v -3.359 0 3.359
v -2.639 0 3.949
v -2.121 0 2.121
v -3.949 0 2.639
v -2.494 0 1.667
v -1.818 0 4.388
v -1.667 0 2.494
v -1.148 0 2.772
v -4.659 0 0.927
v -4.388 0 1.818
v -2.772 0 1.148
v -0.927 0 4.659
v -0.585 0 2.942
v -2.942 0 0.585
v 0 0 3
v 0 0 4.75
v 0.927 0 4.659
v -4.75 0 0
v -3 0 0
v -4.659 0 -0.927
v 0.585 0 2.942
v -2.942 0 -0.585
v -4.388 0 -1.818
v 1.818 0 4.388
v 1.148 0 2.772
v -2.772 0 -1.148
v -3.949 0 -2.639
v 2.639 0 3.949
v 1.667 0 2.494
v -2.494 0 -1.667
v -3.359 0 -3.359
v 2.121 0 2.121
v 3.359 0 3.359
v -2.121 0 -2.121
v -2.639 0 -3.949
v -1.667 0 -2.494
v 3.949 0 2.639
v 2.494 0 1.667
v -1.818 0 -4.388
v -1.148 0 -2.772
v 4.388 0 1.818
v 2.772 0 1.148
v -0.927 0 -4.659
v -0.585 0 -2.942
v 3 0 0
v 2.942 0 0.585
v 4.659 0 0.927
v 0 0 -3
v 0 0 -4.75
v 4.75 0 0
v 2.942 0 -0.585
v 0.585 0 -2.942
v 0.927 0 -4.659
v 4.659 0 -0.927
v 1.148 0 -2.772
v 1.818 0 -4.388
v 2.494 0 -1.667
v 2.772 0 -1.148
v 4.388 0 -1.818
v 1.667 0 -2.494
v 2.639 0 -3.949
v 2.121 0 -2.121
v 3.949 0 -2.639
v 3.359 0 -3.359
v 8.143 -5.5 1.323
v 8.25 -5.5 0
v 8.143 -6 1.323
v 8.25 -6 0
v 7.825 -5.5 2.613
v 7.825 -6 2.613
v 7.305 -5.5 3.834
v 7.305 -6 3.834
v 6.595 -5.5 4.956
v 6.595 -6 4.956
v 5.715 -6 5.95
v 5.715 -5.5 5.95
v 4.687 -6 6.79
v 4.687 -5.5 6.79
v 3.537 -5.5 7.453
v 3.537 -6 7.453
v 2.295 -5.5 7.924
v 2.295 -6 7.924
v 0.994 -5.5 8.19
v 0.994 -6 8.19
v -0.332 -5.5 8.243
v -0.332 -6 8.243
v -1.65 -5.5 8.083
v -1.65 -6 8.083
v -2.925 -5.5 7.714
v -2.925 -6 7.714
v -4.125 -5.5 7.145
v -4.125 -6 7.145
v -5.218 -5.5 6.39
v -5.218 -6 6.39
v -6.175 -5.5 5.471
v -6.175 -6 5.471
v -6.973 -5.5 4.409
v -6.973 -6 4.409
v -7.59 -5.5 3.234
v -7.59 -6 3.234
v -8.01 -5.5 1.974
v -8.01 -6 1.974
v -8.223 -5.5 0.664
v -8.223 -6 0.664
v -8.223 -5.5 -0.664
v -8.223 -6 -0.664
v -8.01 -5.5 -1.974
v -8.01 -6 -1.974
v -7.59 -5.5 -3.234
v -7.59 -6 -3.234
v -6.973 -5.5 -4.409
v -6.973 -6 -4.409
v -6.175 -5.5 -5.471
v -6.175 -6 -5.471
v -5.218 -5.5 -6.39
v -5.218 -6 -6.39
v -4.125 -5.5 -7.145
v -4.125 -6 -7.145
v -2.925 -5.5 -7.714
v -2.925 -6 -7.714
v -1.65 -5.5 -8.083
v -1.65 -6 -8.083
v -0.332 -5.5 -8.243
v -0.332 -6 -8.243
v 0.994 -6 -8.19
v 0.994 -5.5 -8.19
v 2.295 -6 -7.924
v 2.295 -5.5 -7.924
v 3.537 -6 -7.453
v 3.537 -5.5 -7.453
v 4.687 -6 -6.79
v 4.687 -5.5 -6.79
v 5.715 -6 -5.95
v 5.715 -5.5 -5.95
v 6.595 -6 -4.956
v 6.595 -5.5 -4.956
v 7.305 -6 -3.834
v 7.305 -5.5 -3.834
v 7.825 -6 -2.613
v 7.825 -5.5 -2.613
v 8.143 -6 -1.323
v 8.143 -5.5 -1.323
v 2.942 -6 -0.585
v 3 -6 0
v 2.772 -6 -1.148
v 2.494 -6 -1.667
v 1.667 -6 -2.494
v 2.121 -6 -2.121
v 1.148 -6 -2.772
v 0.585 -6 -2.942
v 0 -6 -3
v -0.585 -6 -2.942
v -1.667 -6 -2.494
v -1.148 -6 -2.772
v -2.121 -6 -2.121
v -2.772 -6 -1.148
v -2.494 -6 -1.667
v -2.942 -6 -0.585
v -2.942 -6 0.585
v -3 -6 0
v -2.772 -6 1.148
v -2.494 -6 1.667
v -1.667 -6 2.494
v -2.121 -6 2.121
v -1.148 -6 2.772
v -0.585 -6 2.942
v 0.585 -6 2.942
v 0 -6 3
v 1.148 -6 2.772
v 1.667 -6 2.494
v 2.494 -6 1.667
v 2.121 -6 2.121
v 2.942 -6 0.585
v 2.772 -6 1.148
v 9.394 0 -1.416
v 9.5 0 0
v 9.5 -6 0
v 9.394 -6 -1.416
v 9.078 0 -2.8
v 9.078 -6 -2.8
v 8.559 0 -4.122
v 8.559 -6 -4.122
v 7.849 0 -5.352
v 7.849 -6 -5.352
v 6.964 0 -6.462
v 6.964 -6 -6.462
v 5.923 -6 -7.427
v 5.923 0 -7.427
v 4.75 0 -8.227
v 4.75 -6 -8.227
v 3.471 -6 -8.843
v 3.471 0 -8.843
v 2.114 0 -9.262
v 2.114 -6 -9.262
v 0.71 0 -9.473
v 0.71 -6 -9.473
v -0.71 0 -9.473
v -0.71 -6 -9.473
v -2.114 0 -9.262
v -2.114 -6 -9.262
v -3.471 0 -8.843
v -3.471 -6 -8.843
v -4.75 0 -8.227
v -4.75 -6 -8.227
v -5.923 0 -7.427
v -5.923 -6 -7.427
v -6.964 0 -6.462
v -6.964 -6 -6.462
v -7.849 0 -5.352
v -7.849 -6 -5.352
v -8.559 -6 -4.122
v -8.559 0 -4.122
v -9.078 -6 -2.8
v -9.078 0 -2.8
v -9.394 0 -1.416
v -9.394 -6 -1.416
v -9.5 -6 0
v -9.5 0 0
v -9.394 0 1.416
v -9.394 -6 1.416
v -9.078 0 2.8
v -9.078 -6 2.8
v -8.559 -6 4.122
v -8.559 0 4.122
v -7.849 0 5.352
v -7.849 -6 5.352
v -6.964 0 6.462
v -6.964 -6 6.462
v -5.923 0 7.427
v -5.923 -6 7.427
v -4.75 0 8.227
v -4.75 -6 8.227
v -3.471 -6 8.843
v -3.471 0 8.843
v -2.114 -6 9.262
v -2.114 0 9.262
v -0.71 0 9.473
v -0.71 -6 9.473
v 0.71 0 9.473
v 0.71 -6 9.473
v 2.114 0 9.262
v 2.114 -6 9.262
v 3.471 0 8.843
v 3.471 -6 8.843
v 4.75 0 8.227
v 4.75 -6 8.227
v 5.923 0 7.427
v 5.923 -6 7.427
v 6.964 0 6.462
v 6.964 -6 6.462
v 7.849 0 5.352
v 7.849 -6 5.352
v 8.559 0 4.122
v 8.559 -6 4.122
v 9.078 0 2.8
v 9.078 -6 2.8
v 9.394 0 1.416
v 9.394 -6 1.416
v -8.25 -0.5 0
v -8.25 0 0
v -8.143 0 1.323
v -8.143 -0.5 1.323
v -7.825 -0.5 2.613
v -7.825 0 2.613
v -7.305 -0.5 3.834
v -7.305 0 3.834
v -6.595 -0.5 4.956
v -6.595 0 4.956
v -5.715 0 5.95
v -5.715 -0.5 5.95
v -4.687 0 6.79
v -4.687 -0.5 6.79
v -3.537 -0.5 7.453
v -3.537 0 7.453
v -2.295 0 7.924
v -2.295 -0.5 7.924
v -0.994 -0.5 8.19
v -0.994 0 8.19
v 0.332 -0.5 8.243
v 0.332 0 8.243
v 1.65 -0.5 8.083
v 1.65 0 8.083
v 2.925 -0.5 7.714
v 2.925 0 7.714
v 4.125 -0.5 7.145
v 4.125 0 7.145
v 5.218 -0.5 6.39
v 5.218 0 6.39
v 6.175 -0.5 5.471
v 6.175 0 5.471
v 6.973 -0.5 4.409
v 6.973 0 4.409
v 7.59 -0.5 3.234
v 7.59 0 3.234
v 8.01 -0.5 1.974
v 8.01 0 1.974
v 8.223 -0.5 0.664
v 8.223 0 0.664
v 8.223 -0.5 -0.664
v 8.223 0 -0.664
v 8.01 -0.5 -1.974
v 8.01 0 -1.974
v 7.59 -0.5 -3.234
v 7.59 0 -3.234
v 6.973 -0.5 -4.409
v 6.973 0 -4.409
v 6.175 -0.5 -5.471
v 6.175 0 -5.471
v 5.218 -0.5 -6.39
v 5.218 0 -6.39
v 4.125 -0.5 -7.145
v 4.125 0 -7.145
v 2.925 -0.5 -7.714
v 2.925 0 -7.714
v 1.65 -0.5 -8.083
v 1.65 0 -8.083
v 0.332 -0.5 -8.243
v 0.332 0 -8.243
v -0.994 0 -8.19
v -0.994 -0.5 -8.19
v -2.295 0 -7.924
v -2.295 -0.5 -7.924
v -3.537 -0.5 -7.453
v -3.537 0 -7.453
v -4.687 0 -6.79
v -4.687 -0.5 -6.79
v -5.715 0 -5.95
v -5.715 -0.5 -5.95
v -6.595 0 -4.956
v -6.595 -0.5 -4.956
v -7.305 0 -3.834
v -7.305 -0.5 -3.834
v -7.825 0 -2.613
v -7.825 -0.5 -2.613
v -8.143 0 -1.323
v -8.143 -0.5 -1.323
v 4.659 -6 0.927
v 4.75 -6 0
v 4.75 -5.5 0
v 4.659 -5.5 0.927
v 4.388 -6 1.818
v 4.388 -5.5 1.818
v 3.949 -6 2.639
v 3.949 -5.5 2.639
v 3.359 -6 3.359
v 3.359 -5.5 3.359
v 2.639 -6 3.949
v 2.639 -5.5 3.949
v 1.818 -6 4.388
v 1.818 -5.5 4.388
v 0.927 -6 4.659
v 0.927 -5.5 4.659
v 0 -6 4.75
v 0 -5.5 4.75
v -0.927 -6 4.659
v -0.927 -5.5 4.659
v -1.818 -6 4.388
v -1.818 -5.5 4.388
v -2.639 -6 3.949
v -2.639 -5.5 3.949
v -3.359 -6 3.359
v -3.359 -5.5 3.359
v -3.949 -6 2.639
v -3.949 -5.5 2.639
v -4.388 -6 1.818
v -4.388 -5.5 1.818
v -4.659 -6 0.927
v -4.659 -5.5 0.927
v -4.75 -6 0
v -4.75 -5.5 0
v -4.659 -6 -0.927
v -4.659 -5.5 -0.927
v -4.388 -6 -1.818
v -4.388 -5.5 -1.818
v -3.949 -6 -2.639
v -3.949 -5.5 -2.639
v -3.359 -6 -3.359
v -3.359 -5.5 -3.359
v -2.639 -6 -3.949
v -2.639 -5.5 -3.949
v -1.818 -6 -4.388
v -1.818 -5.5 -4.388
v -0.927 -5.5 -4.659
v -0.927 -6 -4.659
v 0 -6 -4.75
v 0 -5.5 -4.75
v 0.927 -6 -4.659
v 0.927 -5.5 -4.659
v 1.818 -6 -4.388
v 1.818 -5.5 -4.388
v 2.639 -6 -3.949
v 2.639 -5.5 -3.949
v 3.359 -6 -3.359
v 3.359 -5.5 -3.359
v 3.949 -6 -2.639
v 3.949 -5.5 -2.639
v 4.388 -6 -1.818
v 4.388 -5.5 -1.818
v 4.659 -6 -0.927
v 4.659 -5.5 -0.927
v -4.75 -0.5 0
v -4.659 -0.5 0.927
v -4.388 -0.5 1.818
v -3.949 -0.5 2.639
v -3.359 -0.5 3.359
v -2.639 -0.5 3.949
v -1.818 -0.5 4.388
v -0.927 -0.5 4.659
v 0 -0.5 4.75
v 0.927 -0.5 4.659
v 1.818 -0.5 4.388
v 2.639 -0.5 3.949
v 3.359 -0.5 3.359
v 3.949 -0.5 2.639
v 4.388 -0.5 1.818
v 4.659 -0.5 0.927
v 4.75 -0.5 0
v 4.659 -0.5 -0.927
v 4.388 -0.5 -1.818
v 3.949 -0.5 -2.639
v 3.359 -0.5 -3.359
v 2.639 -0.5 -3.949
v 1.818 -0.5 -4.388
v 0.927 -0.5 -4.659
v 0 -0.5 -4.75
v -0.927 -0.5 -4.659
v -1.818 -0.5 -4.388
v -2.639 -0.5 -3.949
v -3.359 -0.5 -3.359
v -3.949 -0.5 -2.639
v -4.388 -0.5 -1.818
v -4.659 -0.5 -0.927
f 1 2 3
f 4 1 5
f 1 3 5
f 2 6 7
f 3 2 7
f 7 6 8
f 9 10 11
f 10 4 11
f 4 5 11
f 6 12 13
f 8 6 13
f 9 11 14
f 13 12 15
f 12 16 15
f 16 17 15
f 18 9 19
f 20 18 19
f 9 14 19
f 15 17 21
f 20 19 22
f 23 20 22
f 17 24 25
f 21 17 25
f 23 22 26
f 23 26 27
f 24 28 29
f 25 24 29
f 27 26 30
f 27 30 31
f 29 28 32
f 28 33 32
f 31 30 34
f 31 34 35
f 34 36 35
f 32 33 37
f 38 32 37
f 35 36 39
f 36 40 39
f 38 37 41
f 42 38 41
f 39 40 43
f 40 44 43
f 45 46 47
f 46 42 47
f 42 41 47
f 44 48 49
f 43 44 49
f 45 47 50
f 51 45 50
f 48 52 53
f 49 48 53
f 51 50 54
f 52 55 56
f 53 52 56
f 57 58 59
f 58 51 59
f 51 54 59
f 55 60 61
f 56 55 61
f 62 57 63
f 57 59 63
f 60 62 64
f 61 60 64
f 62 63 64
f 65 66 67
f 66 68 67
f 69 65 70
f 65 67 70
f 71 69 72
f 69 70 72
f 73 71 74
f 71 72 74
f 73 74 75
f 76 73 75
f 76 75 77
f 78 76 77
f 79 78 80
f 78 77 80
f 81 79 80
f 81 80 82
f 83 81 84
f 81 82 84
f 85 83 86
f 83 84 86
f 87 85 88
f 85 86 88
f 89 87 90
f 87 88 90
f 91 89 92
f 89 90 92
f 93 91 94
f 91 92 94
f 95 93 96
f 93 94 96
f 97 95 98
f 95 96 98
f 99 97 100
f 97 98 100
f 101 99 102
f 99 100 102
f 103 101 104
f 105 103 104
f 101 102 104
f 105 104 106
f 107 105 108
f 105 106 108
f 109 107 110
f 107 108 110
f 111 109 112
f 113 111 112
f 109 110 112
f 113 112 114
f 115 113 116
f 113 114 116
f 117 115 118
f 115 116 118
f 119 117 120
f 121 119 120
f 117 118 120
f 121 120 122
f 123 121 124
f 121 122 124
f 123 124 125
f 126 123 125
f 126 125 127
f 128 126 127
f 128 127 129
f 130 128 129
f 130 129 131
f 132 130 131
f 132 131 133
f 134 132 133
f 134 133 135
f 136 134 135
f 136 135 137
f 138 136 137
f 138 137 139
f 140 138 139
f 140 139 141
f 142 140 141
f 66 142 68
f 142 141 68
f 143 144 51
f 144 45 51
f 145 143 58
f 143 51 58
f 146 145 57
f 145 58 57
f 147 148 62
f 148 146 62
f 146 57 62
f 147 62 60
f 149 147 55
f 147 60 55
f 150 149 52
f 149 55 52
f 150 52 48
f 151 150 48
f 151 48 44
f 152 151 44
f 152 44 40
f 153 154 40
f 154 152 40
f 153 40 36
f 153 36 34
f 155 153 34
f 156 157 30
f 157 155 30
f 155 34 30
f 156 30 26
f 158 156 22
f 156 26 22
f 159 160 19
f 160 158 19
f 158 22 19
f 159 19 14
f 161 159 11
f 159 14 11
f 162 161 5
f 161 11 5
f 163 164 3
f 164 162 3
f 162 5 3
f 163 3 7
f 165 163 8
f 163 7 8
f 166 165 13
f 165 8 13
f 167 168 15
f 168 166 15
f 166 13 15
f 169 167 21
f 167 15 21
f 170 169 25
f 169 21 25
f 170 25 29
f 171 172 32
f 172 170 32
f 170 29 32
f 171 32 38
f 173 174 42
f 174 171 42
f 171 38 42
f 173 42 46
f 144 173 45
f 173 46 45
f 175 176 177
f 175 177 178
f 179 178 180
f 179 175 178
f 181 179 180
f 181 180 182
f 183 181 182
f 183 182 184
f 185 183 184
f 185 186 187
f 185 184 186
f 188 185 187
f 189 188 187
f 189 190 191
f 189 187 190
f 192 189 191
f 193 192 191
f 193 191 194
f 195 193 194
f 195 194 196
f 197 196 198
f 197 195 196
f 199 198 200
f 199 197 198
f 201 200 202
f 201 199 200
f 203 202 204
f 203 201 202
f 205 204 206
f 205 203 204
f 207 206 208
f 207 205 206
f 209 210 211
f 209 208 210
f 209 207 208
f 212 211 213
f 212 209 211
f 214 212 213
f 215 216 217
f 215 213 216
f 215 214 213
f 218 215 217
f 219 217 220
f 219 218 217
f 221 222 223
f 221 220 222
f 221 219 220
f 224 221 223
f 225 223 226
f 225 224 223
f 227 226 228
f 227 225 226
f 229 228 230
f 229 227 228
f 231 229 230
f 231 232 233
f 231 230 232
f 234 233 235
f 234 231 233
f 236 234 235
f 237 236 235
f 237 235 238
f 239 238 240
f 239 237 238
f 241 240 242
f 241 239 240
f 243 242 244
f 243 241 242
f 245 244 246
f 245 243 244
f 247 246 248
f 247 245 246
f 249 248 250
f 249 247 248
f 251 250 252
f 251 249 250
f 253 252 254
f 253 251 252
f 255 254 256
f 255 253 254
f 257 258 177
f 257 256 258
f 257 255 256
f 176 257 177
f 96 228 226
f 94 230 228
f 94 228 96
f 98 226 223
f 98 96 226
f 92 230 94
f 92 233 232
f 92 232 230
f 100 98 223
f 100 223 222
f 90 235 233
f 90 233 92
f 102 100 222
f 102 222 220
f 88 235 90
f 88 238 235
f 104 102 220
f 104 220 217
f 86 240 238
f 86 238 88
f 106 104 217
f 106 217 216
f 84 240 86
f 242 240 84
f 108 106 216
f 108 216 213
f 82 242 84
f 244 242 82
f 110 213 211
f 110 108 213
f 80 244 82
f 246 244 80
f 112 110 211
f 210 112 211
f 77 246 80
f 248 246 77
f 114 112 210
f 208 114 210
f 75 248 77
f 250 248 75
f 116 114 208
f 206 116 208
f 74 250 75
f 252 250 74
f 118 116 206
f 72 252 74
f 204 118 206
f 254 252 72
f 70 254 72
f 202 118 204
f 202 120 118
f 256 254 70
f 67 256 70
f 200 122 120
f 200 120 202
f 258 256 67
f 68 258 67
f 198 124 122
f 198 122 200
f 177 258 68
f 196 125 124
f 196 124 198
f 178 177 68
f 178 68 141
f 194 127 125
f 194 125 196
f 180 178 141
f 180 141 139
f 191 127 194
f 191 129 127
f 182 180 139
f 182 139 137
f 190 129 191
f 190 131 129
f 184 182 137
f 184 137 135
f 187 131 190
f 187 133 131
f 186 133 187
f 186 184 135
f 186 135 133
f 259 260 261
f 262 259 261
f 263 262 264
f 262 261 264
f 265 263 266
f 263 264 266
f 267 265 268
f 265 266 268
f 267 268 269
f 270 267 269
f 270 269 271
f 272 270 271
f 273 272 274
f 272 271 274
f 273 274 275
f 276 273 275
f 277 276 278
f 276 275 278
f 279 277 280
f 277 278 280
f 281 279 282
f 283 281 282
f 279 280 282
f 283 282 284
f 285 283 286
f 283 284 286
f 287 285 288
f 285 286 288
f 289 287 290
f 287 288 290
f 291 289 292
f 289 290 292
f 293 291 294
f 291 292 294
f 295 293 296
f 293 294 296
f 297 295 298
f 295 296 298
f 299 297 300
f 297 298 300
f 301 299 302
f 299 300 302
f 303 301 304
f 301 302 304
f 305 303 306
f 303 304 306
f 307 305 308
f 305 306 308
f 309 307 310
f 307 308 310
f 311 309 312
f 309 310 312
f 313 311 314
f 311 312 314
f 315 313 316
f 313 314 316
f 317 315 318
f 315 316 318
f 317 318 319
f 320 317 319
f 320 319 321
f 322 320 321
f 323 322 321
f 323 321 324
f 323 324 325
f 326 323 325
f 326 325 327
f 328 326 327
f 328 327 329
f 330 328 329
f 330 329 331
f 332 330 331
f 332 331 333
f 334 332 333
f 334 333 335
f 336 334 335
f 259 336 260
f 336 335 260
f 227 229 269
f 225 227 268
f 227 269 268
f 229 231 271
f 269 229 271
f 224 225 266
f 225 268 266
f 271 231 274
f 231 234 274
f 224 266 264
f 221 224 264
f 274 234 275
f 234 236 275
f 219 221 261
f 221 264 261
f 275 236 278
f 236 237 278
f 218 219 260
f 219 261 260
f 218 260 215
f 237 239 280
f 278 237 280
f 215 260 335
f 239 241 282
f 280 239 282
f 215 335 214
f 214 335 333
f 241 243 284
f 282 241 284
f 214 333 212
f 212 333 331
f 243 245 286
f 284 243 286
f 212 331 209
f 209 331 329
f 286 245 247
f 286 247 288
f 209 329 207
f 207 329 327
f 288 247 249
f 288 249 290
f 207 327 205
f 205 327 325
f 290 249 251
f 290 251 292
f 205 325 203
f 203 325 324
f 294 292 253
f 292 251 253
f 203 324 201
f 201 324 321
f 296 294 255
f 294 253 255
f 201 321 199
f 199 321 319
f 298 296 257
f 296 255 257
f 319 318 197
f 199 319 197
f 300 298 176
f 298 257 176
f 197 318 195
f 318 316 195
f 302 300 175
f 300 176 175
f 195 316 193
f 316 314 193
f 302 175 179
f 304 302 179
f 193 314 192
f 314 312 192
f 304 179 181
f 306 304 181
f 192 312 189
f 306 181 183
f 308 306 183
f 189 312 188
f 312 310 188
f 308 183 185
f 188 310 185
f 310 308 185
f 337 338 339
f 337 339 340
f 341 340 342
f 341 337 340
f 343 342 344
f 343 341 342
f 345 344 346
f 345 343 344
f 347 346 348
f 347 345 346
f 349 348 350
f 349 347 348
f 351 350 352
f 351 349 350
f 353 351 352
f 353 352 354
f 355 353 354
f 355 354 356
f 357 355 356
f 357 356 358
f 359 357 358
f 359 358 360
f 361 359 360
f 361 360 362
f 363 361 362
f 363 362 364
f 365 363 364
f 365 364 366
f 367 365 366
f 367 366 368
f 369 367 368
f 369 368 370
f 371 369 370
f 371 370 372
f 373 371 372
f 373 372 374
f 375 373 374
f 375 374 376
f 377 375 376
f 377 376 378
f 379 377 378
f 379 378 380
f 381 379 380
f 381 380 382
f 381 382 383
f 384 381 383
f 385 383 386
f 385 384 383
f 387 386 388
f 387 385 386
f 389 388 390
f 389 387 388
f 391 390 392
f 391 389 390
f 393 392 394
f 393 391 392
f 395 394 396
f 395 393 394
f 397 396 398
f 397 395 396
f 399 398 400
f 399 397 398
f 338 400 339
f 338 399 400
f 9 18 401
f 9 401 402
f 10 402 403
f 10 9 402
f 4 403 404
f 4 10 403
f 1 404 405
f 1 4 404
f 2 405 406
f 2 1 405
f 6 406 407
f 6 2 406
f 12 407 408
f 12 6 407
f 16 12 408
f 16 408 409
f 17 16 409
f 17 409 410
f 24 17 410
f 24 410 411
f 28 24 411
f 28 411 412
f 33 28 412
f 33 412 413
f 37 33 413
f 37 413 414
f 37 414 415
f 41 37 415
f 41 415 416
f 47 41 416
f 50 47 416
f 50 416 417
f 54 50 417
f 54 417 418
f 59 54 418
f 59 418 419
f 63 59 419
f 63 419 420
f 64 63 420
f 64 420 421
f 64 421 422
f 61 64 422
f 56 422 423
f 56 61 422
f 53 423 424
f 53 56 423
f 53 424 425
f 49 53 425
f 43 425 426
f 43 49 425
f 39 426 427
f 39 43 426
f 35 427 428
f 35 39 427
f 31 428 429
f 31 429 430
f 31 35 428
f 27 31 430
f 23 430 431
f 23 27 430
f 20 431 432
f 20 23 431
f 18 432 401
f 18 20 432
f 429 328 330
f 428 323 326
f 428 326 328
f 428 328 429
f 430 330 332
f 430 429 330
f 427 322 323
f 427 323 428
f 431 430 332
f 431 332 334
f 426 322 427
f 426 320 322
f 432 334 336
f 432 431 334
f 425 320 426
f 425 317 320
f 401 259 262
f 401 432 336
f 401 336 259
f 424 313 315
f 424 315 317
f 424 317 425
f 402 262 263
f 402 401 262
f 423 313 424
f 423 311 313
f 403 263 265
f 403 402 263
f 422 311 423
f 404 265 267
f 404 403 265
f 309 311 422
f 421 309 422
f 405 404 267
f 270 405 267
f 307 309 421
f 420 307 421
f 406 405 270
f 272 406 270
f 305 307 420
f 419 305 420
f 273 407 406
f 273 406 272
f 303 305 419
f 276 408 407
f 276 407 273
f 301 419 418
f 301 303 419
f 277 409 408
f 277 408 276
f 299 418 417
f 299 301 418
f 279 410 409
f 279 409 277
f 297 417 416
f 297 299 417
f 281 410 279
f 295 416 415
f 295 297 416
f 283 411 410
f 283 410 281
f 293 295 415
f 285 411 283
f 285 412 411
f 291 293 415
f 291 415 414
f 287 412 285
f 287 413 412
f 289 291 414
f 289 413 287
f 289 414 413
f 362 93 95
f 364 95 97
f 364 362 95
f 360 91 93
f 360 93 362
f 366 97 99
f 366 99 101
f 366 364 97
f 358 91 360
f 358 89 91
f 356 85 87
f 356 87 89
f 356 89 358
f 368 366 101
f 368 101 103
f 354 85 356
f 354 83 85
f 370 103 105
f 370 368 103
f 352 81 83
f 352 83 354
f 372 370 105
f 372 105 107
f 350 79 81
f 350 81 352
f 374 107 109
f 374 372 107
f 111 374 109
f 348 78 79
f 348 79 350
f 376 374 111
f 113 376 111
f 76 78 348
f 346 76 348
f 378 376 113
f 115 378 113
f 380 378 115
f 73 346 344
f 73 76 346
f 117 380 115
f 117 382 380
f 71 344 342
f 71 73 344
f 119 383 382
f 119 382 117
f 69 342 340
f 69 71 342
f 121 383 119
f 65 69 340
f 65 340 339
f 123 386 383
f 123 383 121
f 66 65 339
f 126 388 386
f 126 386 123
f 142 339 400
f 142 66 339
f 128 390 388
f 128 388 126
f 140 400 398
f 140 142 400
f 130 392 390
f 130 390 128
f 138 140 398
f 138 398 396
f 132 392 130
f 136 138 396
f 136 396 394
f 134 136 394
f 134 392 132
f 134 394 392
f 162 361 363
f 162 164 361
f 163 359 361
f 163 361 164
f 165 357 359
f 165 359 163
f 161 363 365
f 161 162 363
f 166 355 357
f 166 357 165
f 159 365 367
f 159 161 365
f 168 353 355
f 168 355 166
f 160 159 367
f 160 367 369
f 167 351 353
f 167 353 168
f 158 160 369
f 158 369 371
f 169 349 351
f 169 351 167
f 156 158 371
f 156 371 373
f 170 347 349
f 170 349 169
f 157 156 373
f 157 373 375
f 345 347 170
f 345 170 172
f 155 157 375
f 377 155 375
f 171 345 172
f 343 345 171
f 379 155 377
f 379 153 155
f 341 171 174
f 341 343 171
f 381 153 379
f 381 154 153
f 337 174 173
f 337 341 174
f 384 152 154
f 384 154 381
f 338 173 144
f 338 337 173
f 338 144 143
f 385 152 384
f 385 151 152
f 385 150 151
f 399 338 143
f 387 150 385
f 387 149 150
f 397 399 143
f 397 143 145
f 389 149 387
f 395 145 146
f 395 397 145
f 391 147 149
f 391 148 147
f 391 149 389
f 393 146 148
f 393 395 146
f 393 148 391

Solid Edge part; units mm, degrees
sketch "Sketch1" plane through (0, 0, 0) normal (0, -1, 0) x (1, 0, 0)
  circle A0 centre (0, 0) radius 9.5
  circle A1 centre (0, 0) radius 3
  dimension "D1" = 6
  dimension "D2" = 19
extrude "Protrusion1" add sketch "Sketch1" along normal blind 6
sketch "Sketch2" plane through (0, 0, 0) normal (0, 1, 0) x (-1, 0, 0)
  circle A0 centre (0, 0) radius 8.25
  circle A1 centre (0, 0) radius 4.75
extrude "ExtrudedCutout_1" cut sketch "Sketch2" against normal blind 0.5
sketch "Sketch3" plane through (0, -6, 0) normal (0, -1, 0) x (1, 0, 0)
  circle A0 centre (0, 0) radius 8.25
  circle A1 centre (0, 0) radius 4.75
extrude "ExtrudedCutout_4" cut sketch "Sketch3" against normal blind 0.5
properties material "Steel"
